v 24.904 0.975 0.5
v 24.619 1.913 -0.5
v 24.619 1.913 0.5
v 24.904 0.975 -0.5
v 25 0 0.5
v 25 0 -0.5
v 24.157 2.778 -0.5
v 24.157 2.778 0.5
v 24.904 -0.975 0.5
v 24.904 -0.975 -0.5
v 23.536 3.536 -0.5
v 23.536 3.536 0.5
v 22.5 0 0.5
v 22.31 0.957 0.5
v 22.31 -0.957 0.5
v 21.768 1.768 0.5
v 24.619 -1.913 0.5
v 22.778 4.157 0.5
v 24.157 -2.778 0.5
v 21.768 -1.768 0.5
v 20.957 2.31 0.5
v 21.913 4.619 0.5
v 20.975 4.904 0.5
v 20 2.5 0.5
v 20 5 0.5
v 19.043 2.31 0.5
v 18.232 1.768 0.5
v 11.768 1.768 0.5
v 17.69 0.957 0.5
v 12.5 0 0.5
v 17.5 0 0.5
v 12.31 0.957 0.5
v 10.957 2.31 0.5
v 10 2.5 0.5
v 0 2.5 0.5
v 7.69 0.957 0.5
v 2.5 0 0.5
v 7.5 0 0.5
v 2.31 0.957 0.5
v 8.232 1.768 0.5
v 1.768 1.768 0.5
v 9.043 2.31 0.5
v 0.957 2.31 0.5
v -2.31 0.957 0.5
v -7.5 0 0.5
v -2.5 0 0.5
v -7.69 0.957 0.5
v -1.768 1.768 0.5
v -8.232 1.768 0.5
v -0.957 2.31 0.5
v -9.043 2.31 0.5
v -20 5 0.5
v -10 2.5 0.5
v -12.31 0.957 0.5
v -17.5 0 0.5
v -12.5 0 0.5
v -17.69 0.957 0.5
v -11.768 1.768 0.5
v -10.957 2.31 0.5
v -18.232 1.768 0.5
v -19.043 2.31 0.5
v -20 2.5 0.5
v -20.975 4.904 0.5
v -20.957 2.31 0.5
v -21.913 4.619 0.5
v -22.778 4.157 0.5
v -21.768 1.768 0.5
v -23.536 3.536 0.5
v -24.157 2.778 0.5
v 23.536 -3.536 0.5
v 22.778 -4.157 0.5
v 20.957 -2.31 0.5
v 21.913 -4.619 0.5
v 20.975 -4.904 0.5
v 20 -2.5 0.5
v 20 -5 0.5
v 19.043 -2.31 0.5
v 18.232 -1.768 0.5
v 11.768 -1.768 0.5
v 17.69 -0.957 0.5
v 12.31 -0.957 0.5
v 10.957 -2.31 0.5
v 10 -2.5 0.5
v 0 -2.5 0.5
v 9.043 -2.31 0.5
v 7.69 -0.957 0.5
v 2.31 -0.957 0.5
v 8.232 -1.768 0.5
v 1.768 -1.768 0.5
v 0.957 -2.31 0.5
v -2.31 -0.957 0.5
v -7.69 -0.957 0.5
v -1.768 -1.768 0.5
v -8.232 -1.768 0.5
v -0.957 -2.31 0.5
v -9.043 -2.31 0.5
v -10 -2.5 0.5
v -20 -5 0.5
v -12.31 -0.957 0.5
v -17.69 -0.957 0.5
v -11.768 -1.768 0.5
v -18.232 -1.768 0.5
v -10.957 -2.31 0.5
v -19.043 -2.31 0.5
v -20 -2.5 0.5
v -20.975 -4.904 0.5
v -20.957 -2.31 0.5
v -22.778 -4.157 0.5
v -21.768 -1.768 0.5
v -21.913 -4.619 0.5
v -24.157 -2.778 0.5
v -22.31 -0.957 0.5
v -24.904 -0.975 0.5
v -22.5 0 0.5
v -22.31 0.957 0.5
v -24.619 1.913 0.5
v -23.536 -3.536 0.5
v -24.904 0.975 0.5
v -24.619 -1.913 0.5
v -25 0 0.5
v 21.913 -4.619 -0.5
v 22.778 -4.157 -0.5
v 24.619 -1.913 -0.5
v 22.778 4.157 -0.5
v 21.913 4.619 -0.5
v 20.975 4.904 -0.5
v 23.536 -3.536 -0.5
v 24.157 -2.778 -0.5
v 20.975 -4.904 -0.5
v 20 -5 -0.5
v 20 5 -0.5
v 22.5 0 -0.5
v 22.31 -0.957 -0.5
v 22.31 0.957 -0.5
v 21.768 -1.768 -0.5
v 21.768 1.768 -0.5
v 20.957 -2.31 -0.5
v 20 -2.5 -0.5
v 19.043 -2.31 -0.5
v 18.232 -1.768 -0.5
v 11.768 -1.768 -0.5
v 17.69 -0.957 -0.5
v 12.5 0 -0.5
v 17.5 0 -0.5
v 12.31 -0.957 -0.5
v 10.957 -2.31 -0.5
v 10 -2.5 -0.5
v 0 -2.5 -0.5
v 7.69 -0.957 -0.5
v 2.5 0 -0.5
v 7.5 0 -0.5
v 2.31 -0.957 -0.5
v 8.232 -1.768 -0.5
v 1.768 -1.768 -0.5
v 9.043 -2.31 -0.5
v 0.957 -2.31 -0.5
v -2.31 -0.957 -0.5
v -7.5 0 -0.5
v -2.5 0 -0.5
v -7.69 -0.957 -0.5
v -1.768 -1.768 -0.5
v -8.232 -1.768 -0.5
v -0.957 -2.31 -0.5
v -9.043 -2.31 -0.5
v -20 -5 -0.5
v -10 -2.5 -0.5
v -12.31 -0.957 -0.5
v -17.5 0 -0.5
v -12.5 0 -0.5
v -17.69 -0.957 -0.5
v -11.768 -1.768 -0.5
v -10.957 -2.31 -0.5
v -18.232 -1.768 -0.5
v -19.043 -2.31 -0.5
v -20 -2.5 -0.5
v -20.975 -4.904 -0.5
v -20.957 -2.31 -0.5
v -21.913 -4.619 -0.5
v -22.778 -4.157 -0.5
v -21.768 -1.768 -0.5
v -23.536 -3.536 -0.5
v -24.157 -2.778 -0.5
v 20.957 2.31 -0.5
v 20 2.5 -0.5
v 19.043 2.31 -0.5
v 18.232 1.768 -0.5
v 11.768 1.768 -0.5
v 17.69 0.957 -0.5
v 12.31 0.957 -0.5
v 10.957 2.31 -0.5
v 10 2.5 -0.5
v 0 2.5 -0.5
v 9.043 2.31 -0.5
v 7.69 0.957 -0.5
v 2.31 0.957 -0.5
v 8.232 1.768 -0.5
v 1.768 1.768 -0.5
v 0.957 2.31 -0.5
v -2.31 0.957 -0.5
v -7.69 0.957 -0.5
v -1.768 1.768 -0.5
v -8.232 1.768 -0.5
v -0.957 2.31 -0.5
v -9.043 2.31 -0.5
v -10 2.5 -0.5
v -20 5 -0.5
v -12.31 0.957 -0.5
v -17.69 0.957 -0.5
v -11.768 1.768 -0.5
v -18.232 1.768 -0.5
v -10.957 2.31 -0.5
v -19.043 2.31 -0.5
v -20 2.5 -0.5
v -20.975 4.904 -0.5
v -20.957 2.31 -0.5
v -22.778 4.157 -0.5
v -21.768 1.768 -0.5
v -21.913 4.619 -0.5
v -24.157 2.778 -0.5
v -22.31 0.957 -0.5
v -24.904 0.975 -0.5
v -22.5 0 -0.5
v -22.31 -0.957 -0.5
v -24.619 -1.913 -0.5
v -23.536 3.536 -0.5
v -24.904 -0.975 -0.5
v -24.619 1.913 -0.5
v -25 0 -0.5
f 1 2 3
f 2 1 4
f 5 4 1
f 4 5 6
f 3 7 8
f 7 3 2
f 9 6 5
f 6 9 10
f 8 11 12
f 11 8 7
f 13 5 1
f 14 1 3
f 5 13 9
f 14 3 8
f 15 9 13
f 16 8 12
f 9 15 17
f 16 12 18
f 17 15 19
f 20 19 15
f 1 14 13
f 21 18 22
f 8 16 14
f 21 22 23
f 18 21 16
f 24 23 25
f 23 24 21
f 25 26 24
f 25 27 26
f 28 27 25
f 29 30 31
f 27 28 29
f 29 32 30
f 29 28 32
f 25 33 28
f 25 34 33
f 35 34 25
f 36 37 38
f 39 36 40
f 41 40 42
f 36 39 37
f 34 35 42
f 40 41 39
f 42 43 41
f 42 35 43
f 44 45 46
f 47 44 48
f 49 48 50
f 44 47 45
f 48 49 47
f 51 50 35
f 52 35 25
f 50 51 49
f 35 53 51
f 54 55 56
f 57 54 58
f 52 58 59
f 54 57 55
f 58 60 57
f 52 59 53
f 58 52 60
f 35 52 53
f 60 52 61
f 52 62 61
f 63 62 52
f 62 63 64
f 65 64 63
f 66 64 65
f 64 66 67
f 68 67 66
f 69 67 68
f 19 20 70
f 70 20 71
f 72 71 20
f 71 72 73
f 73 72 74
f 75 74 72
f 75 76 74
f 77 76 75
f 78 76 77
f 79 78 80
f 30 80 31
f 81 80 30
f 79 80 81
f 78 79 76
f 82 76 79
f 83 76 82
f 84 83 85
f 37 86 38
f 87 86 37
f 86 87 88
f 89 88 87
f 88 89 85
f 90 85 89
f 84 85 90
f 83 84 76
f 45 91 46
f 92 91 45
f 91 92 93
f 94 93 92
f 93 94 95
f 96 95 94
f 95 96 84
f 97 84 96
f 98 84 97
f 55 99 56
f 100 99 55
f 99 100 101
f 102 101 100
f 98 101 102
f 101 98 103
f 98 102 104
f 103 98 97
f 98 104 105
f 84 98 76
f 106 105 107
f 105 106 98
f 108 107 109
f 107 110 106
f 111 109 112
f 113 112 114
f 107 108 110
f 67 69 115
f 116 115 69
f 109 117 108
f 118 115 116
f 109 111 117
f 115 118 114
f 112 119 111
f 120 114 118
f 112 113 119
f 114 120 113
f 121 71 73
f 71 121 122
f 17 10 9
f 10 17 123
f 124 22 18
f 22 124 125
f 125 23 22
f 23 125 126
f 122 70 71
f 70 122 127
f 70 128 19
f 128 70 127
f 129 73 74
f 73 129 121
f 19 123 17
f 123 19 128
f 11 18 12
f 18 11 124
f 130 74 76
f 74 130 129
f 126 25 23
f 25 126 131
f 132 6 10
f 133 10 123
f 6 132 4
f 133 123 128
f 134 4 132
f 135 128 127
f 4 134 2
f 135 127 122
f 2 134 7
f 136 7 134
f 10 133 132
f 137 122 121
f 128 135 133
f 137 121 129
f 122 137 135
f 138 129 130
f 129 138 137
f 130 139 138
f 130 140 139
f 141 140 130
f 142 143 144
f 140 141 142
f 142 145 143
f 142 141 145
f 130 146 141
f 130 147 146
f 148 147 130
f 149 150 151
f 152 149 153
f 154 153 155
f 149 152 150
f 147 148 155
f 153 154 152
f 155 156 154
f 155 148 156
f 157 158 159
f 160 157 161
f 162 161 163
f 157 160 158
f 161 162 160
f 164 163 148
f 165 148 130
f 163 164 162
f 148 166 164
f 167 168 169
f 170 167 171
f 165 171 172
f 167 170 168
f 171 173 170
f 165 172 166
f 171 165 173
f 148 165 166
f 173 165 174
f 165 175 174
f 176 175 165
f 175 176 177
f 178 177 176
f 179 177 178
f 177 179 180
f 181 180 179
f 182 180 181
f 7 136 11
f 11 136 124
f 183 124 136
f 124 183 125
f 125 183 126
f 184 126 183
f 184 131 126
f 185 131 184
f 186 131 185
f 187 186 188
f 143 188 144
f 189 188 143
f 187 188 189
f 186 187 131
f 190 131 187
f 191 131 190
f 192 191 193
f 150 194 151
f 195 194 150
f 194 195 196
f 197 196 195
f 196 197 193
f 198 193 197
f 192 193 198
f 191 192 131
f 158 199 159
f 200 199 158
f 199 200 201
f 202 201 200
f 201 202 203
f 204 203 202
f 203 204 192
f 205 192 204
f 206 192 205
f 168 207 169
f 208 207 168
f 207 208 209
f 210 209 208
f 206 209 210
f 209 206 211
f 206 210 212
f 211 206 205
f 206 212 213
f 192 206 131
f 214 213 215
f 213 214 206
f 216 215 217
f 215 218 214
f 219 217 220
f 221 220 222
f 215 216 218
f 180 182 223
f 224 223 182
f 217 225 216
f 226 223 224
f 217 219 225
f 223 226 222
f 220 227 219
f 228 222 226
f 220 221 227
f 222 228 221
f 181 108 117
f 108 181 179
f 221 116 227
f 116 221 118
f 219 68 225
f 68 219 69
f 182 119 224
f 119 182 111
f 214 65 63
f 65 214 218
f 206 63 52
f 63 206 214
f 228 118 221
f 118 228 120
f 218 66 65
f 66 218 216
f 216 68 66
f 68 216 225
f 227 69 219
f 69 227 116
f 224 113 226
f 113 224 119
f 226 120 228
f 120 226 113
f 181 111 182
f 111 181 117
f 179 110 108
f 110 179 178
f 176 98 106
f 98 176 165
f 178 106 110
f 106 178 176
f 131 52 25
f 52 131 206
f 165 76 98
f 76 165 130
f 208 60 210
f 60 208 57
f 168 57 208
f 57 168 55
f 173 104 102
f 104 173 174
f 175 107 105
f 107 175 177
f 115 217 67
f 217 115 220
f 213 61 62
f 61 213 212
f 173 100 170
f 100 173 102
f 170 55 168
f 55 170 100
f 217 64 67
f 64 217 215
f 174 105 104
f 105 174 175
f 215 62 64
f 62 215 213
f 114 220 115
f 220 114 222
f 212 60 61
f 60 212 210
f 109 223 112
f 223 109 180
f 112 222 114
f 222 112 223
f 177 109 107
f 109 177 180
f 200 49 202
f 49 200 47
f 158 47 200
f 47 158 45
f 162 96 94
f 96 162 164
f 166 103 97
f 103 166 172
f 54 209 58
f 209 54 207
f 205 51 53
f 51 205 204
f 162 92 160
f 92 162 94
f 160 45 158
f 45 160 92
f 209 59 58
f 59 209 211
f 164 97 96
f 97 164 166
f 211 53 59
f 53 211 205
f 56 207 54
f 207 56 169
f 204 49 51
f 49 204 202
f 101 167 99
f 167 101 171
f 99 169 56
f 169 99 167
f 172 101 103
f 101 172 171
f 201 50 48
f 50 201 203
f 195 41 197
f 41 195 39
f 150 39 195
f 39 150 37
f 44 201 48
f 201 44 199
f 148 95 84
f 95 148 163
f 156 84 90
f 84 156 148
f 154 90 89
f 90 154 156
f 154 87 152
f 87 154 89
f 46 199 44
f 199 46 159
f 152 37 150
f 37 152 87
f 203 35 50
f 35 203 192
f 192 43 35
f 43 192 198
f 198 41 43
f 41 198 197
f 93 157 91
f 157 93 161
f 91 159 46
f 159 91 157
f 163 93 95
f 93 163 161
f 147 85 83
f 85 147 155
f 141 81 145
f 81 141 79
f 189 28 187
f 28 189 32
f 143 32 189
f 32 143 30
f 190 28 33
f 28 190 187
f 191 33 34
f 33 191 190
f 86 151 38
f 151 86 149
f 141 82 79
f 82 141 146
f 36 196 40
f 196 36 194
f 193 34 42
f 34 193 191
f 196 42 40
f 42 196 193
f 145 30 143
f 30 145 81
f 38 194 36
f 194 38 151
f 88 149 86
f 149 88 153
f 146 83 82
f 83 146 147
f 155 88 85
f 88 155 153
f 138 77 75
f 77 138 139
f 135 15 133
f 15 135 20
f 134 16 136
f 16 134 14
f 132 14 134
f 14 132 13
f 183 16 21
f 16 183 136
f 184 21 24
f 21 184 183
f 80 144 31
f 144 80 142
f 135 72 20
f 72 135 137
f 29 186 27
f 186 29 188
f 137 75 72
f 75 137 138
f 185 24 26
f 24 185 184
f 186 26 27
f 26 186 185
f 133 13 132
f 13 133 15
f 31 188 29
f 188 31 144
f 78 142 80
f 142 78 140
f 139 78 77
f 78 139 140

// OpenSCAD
height = 1.0; // mm
width = 10.0; // mm
total_length = 50.0; //mm

hole_diameter = 5.0; // mm
hole_distances_from_center = [-20:10:20]; // [mm]

$fa = 1.0;
$fs = 1.0;

difference()
{
    union()
    {
        cube([total_length - width, width, height], center=true);
        {
            for (sign = [+1,-1])
            translate([(total_length - total_length/2 - width/2)*sign, 0, 0])
            {
                cylinder(r=width/2, h=height, center=true);
            };
        };
    };
    union()
    {   for (hole_distance_from_center = hole_distances_from_center)
        translate([hole_distance_from_center, 0, 0])
        {
            cylinder(r=hole_diameter/2, h=height + 1.0, center=true);
        };
    }
}
